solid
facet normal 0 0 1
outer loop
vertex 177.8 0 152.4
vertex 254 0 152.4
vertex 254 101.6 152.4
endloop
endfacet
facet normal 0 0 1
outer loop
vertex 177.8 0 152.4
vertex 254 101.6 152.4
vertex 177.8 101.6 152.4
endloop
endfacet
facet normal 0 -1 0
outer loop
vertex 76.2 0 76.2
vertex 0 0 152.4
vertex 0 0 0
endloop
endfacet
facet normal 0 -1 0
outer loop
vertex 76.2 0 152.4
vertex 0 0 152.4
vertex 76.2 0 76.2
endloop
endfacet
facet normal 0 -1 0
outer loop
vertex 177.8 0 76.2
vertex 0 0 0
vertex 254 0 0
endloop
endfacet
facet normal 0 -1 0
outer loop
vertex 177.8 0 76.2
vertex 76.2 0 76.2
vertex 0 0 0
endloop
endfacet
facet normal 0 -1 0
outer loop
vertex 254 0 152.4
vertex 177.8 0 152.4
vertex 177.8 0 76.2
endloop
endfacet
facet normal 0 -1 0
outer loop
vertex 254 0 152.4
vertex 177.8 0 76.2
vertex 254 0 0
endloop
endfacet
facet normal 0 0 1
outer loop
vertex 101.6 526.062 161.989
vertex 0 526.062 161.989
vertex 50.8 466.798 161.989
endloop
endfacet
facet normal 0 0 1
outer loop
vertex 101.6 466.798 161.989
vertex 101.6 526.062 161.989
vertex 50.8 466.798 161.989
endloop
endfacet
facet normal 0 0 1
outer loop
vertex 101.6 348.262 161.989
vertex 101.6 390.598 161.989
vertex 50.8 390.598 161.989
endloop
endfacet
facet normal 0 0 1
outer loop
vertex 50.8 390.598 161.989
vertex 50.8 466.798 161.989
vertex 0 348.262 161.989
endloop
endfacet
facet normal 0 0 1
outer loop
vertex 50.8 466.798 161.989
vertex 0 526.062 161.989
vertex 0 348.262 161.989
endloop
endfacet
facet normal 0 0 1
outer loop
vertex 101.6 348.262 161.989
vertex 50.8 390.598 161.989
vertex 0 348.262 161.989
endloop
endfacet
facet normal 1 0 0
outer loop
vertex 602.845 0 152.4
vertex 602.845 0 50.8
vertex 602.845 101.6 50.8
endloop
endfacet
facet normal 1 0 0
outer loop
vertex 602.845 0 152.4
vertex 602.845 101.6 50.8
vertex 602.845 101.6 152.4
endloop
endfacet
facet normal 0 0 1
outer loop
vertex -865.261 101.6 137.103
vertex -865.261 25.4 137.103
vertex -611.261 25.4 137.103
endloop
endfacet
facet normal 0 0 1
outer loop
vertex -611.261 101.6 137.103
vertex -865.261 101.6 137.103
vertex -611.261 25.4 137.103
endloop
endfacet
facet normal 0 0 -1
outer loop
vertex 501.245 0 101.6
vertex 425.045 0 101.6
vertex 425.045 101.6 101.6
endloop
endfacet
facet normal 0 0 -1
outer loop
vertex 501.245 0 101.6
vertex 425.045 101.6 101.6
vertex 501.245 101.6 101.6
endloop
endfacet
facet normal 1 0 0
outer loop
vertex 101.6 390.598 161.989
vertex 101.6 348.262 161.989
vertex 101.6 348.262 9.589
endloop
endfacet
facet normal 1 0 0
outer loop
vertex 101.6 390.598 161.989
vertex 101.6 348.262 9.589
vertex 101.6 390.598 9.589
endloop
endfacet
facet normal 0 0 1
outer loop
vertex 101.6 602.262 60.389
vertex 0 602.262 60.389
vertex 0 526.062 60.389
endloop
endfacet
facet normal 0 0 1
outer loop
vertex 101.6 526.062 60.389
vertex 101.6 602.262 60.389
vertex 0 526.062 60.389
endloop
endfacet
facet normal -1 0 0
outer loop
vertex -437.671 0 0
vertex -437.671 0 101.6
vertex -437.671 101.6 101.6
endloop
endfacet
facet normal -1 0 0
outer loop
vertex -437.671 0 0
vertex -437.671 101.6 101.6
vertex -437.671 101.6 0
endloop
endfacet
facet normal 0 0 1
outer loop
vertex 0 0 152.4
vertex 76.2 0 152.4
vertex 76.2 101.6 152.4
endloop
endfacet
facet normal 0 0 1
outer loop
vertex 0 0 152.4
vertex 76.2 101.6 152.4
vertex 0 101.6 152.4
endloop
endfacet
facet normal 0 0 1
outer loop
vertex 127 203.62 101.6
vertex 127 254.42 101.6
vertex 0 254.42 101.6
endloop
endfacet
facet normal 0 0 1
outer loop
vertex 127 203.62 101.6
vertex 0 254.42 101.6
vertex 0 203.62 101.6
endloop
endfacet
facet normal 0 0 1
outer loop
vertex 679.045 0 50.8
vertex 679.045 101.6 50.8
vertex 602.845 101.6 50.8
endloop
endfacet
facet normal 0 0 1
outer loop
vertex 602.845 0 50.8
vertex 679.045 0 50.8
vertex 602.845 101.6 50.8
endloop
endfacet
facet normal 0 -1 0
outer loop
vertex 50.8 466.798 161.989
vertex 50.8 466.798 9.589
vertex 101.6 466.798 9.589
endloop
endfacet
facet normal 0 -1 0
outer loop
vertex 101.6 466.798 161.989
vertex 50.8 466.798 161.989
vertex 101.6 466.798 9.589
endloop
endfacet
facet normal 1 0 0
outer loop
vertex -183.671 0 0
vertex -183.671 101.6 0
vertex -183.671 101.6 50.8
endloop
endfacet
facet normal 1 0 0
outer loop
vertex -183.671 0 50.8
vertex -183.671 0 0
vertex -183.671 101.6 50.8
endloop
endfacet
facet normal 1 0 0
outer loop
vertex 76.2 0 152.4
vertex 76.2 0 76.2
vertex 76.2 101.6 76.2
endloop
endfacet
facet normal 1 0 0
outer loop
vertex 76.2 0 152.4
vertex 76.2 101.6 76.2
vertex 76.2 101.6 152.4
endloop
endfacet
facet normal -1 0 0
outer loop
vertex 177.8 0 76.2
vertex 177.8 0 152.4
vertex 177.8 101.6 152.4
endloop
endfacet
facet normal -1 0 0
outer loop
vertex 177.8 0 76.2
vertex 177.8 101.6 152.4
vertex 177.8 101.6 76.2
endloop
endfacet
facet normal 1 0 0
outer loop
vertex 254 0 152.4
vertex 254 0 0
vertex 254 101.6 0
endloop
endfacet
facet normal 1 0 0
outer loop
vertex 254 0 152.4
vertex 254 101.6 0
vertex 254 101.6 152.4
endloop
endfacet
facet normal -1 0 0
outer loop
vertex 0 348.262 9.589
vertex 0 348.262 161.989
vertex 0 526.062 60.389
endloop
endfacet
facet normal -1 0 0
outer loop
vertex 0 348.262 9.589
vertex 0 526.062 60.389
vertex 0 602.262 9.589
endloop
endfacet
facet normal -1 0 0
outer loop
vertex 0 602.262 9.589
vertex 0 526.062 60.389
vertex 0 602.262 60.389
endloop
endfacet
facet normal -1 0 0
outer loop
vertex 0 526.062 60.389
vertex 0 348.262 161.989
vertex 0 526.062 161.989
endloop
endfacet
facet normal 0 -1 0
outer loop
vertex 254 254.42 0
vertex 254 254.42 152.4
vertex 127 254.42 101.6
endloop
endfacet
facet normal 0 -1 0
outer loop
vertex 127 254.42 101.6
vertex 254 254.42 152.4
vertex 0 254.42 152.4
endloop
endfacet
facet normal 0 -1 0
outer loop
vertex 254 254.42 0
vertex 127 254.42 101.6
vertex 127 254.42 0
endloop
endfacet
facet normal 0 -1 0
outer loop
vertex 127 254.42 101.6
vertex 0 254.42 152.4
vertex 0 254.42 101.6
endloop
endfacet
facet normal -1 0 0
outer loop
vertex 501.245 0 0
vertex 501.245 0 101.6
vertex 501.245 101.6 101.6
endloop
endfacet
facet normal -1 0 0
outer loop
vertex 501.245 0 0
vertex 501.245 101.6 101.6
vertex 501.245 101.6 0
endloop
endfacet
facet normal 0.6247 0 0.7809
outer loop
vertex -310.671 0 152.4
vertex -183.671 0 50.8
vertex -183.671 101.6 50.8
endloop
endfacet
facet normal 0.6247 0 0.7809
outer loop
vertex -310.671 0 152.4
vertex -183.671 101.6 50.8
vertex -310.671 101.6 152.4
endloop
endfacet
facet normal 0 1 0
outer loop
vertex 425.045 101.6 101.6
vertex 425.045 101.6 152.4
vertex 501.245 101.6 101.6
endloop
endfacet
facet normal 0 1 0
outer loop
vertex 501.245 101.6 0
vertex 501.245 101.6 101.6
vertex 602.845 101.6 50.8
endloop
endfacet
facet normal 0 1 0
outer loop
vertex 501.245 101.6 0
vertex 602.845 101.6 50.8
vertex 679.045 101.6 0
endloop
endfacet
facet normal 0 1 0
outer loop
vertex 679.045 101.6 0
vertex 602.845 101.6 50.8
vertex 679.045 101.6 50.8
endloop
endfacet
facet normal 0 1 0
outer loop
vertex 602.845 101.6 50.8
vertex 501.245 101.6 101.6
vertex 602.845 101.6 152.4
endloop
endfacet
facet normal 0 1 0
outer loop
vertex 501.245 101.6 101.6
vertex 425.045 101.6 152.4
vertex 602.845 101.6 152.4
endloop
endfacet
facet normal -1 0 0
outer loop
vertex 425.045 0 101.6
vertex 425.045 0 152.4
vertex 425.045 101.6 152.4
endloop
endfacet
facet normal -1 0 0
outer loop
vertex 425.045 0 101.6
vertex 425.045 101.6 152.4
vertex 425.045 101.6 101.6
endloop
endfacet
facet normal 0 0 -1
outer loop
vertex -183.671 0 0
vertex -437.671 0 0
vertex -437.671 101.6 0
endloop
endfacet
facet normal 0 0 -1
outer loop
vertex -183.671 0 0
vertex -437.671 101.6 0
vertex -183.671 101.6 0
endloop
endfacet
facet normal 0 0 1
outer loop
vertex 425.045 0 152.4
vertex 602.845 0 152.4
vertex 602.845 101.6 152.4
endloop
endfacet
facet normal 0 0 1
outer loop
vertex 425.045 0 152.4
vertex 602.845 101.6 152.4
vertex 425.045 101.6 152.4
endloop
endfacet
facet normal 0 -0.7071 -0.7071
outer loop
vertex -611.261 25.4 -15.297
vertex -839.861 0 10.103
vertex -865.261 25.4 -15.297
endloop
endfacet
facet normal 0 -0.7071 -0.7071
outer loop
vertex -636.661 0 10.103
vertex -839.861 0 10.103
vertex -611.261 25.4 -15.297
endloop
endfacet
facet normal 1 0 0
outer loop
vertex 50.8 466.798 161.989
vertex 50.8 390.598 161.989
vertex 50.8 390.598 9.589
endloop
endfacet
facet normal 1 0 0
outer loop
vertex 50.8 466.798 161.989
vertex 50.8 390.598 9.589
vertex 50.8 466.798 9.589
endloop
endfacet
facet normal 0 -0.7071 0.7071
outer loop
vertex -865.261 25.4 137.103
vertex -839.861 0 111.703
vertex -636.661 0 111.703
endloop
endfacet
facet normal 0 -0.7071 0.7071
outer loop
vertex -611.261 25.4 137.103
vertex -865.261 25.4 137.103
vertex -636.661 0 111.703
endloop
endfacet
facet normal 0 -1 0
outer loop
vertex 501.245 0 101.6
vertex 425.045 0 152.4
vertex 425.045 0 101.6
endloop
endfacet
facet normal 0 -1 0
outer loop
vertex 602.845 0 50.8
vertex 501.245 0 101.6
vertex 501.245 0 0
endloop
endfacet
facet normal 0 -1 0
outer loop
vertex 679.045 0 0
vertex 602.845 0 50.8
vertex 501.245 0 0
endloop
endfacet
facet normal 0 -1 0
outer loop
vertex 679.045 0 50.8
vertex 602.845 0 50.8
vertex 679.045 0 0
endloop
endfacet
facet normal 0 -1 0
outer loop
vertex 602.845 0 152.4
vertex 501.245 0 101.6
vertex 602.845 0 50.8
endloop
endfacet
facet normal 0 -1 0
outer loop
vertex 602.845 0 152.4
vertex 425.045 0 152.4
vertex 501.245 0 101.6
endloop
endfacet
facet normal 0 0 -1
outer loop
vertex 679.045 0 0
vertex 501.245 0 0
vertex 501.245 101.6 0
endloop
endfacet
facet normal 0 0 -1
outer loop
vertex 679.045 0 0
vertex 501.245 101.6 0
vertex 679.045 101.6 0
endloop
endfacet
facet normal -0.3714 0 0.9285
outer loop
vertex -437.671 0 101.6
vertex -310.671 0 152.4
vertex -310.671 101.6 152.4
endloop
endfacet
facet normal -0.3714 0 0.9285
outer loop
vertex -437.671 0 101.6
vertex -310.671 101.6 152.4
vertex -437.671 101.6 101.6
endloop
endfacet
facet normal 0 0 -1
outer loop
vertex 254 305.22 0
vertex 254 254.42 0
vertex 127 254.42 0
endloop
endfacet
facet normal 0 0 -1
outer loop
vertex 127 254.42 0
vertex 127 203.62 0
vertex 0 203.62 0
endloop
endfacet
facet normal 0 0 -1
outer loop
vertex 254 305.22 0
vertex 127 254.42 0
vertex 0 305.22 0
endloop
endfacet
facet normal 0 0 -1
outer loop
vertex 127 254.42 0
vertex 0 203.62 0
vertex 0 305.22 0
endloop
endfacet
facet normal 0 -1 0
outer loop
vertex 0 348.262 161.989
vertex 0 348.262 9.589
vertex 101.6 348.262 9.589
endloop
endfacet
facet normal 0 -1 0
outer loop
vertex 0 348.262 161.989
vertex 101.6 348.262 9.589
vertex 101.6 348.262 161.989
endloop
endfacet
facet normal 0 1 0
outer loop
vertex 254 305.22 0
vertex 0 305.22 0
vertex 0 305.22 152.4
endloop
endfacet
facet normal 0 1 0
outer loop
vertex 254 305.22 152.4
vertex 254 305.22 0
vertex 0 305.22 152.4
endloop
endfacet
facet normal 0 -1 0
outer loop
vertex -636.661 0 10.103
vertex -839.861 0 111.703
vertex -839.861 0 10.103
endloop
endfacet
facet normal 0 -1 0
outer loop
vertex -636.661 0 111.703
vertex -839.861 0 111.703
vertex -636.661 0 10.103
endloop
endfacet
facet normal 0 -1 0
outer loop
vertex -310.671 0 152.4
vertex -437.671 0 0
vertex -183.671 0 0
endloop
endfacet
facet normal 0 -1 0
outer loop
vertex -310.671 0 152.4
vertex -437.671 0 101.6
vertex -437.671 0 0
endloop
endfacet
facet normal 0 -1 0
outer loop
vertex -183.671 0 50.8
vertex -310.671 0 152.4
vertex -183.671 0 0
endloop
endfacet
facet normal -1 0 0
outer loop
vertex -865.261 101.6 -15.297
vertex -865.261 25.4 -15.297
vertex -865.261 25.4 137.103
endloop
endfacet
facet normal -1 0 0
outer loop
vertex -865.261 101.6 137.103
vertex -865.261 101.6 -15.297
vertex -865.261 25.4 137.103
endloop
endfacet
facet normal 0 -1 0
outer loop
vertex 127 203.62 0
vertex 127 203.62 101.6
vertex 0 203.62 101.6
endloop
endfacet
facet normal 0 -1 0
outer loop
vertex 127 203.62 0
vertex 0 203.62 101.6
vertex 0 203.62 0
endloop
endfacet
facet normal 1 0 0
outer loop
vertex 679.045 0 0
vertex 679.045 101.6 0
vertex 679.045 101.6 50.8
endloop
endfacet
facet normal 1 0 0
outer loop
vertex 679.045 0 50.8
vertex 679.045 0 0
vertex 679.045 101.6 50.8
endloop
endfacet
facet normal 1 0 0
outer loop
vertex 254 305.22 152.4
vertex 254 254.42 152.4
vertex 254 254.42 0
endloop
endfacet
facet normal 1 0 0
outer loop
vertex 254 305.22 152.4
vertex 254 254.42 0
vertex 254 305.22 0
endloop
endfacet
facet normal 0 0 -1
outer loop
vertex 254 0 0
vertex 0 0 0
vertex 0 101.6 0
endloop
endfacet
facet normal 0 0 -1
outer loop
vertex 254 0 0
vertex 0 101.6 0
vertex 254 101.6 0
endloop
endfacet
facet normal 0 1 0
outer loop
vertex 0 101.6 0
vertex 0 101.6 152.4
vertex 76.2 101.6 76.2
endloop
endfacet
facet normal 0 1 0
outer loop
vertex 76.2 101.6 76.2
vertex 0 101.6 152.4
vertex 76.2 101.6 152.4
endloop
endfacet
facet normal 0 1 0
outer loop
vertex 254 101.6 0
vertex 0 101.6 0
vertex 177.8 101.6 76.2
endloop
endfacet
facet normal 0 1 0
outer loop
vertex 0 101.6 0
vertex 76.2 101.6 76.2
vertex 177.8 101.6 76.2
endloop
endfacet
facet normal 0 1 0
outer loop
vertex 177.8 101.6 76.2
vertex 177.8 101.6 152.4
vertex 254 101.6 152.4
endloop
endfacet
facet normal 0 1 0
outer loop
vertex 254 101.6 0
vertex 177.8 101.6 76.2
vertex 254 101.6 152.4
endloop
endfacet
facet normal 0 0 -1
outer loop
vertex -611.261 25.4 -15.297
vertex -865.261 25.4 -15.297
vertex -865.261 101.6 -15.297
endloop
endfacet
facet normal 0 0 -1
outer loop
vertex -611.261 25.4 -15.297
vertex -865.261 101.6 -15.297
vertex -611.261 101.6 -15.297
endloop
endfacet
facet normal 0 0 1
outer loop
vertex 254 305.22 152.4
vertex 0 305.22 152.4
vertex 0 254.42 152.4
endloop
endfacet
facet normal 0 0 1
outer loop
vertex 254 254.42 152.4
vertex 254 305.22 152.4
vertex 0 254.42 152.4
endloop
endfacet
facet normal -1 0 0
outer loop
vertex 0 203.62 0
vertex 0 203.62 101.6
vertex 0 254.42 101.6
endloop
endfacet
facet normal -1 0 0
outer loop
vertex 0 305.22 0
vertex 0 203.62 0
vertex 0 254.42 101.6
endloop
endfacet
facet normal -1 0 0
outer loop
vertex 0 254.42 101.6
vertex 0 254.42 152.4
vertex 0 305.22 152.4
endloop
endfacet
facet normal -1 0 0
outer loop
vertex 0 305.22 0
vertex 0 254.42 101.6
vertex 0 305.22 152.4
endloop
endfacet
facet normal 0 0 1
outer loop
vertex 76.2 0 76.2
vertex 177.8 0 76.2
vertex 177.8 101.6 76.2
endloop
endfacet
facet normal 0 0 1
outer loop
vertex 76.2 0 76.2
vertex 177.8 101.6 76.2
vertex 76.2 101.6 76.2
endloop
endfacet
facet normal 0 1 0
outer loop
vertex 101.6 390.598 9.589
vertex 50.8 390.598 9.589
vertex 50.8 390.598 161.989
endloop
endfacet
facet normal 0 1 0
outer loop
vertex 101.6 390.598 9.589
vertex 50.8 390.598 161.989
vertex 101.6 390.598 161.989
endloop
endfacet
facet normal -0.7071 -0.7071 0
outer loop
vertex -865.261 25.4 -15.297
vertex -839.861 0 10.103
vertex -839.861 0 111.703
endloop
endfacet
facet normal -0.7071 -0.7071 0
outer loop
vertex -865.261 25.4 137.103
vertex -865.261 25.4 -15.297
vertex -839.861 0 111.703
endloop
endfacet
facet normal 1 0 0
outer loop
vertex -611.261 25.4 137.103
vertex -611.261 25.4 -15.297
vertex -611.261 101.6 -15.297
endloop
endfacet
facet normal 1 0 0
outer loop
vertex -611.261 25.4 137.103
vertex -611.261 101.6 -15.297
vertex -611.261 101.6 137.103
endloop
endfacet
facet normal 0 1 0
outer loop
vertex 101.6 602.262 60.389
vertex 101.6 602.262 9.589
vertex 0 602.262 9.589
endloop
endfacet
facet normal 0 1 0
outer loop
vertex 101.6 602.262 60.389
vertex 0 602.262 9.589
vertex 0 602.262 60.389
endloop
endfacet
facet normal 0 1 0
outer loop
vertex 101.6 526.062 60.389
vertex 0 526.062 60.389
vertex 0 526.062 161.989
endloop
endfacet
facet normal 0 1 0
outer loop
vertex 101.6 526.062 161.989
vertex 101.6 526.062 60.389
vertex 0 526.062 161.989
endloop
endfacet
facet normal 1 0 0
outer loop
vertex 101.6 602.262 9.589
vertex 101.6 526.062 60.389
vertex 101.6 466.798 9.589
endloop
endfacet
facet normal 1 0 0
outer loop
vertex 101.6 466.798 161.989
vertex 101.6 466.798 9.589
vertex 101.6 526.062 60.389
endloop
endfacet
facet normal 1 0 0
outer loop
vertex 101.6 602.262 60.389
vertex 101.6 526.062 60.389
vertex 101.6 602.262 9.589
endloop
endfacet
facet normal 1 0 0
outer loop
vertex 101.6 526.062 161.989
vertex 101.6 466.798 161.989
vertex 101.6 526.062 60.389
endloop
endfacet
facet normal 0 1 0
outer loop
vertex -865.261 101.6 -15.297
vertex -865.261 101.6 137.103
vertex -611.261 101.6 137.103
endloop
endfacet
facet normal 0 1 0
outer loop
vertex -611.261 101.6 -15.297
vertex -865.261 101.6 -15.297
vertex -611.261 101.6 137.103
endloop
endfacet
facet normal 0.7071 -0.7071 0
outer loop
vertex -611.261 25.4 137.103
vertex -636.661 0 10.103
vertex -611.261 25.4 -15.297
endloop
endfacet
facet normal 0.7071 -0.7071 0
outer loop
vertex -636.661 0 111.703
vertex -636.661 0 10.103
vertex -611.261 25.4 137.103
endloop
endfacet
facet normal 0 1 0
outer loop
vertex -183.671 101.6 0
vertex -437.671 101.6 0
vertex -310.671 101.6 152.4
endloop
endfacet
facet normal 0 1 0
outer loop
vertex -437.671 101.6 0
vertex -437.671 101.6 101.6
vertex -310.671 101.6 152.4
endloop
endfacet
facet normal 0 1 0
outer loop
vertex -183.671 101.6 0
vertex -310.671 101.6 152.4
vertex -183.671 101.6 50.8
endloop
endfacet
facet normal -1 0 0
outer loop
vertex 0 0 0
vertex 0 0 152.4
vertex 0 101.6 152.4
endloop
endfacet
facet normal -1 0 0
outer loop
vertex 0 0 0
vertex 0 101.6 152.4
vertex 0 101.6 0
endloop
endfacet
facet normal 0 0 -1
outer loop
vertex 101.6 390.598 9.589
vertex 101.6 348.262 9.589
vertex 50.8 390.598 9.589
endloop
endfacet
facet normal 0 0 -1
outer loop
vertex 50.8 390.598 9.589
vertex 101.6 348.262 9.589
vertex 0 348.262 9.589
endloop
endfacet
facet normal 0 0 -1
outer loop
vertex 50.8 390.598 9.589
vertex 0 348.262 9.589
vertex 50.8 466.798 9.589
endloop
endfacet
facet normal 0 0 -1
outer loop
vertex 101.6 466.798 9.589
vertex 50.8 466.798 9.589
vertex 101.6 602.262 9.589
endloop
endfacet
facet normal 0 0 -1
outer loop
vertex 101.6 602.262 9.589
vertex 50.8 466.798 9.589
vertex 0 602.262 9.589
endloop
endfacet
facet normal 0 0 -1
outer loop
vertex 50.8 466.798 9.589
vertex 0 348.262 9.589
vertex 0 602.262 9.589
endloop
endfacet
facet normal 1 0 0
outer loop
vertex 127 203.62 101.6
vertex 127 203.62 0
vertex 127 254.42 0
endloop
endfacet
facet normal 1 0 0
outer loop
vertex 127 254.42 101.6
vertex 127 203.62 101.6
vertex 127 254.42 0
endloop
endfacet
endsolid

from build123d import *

# Parameters (mm, degrees)
F1_DEPTH  = 101.6
F3_DEPTH  = 254
F4_W      = 50.8
F4_H      = 101.6
F5_DEPTH  = 127
F6_W      = 76.1873728009
F6_H      = 152.4
F6_W_2    = 50.8
F7_DEPTH  = 101.6
F8_W      = 50.8
F8_H      = 76.2
F9_DEPTH  = 152.4
F11_DEPTH = 101.6
F13_DEPTH = 101.6
F14_W     = 254
F14_H     = 152.4
F15_DEPTH = 101.6
F16_SIZE  = 25.4


with BuildPart() as f1:
    # F0 (on Front) → F1 (new body)
    with BuildSketch(Plane.XZ):
        Polygon((0, 152.4), (0, 0), (254, 0), (254, 152.4), (177.8, 152.4), (177.8, 76.2), (76.2, 76.2), (76.2, 152.4), align=None)
    extrude(amount=-F1_DEPTH)


with BuildPart() as f3:
    # F2 (on Right) → F3 (new body)
    with BuildSketch(Plane.YZ):
        Polygon((203.6196578976, 101.6), (203.6196578976, 0), (305.2196578976, 0), (305.2196578976, 152.4), (254.4196578976, 152.4), (254.4196578976, 101.6), align=None)
    extrude(amount=F3_DEPTH)

    # F4 (on face) → F5 (cut)
    with BuildSketch(Plane.YZ.offset(254)):
        with Locations((229.0196578976, 50.8)):
            Rectangle(F4_W, F4_H)
    extrude(amount=-F5_DEPTH, mode=Mode.SUBTRACT)


with BuildPart() as f7:
    # F6 (on Right) → F7 (new body)
    with BuildSketch(Plane.YZ):
        with Locations((437.15617031, 85.7893498145)):
            Rectangle(F6_W, F6_H)
        with Locations((373.6624839095, 85.7893498145)):
            Rectangle(F6_W_2, F6_H)
        Polygon((526.0624839095, 161.9893498145), (475.2498567104, 161.9893498145), (475.2498567104, 9.5893498145), (602.2624839095, 9.5893498145), (602.2624839095, 60.3893498145), (526.0624839095, 60.3893498145), align=None)
    extrude(amount=F7_DEPTH)

    # F8 (on face) → F9 (cut)
    with BuildSketch(Plane.XY.offset(161.9893498145)):
        with Locations((76.2, 428.6984247208)):
            Rectangle(F8_W, F8_H)
    extrude(amount=-F9_DEPTH, mode=Mode.SUBTRACT)


with BuildPart() as f11:
    # F10 (on Front) → F11 (new body)
    with BuildSketch(Plane.XZ):
        Polygon((602.8445832853, 152.4), (425.0445832853, 152.4), (425.0445832853, 101.6), (501.2445832853, 101.6), (501.2445832853, 0), (679.0445832853, 0), (679.0445832853, 50.8), (602.8445832853, 50.8), align=None)
    extrude(amount=-F11_DEPTH)


with BuildPart() as f13:
    # F12 (on Front) → F13 (new body)
    with BuildSketch(Plane.XZ):
        Polygon((-437.6706745207, 0), (-183.6706745207, 0), (-183.6706745207, 50.8), (-310.6706745207, 152.4), (-437.6706745207, 101.6), align=None)
    extrude(amount=-F13_DEPTH)


with BuildPart() as f15:
    # F14 (on Front) → F15 (new body)
    with BuildSketch(Plane.XZ):
        with Locations((-738.2608056068, 60.9033322741)):
            Rectangle(F14_W, F14_H)
    extrude(amount=-F15_DEPTH)

    # F16
    f16_edges = [f15.edges().sort_by_distance(p)[0] for p in [
        (-611.260806, 0, 60.903332),
        (-738.260806, 0, 137.103332),
        (-865.260806, 0, 60.903332),
        (-738.260806, 0, -15.296668),
    ]]
    chamfer(f16_edges, length=F16_SIZE)


solid = Compound([f1.part, f3.part, f7.part, f11.part, f13.part, f15.part])
